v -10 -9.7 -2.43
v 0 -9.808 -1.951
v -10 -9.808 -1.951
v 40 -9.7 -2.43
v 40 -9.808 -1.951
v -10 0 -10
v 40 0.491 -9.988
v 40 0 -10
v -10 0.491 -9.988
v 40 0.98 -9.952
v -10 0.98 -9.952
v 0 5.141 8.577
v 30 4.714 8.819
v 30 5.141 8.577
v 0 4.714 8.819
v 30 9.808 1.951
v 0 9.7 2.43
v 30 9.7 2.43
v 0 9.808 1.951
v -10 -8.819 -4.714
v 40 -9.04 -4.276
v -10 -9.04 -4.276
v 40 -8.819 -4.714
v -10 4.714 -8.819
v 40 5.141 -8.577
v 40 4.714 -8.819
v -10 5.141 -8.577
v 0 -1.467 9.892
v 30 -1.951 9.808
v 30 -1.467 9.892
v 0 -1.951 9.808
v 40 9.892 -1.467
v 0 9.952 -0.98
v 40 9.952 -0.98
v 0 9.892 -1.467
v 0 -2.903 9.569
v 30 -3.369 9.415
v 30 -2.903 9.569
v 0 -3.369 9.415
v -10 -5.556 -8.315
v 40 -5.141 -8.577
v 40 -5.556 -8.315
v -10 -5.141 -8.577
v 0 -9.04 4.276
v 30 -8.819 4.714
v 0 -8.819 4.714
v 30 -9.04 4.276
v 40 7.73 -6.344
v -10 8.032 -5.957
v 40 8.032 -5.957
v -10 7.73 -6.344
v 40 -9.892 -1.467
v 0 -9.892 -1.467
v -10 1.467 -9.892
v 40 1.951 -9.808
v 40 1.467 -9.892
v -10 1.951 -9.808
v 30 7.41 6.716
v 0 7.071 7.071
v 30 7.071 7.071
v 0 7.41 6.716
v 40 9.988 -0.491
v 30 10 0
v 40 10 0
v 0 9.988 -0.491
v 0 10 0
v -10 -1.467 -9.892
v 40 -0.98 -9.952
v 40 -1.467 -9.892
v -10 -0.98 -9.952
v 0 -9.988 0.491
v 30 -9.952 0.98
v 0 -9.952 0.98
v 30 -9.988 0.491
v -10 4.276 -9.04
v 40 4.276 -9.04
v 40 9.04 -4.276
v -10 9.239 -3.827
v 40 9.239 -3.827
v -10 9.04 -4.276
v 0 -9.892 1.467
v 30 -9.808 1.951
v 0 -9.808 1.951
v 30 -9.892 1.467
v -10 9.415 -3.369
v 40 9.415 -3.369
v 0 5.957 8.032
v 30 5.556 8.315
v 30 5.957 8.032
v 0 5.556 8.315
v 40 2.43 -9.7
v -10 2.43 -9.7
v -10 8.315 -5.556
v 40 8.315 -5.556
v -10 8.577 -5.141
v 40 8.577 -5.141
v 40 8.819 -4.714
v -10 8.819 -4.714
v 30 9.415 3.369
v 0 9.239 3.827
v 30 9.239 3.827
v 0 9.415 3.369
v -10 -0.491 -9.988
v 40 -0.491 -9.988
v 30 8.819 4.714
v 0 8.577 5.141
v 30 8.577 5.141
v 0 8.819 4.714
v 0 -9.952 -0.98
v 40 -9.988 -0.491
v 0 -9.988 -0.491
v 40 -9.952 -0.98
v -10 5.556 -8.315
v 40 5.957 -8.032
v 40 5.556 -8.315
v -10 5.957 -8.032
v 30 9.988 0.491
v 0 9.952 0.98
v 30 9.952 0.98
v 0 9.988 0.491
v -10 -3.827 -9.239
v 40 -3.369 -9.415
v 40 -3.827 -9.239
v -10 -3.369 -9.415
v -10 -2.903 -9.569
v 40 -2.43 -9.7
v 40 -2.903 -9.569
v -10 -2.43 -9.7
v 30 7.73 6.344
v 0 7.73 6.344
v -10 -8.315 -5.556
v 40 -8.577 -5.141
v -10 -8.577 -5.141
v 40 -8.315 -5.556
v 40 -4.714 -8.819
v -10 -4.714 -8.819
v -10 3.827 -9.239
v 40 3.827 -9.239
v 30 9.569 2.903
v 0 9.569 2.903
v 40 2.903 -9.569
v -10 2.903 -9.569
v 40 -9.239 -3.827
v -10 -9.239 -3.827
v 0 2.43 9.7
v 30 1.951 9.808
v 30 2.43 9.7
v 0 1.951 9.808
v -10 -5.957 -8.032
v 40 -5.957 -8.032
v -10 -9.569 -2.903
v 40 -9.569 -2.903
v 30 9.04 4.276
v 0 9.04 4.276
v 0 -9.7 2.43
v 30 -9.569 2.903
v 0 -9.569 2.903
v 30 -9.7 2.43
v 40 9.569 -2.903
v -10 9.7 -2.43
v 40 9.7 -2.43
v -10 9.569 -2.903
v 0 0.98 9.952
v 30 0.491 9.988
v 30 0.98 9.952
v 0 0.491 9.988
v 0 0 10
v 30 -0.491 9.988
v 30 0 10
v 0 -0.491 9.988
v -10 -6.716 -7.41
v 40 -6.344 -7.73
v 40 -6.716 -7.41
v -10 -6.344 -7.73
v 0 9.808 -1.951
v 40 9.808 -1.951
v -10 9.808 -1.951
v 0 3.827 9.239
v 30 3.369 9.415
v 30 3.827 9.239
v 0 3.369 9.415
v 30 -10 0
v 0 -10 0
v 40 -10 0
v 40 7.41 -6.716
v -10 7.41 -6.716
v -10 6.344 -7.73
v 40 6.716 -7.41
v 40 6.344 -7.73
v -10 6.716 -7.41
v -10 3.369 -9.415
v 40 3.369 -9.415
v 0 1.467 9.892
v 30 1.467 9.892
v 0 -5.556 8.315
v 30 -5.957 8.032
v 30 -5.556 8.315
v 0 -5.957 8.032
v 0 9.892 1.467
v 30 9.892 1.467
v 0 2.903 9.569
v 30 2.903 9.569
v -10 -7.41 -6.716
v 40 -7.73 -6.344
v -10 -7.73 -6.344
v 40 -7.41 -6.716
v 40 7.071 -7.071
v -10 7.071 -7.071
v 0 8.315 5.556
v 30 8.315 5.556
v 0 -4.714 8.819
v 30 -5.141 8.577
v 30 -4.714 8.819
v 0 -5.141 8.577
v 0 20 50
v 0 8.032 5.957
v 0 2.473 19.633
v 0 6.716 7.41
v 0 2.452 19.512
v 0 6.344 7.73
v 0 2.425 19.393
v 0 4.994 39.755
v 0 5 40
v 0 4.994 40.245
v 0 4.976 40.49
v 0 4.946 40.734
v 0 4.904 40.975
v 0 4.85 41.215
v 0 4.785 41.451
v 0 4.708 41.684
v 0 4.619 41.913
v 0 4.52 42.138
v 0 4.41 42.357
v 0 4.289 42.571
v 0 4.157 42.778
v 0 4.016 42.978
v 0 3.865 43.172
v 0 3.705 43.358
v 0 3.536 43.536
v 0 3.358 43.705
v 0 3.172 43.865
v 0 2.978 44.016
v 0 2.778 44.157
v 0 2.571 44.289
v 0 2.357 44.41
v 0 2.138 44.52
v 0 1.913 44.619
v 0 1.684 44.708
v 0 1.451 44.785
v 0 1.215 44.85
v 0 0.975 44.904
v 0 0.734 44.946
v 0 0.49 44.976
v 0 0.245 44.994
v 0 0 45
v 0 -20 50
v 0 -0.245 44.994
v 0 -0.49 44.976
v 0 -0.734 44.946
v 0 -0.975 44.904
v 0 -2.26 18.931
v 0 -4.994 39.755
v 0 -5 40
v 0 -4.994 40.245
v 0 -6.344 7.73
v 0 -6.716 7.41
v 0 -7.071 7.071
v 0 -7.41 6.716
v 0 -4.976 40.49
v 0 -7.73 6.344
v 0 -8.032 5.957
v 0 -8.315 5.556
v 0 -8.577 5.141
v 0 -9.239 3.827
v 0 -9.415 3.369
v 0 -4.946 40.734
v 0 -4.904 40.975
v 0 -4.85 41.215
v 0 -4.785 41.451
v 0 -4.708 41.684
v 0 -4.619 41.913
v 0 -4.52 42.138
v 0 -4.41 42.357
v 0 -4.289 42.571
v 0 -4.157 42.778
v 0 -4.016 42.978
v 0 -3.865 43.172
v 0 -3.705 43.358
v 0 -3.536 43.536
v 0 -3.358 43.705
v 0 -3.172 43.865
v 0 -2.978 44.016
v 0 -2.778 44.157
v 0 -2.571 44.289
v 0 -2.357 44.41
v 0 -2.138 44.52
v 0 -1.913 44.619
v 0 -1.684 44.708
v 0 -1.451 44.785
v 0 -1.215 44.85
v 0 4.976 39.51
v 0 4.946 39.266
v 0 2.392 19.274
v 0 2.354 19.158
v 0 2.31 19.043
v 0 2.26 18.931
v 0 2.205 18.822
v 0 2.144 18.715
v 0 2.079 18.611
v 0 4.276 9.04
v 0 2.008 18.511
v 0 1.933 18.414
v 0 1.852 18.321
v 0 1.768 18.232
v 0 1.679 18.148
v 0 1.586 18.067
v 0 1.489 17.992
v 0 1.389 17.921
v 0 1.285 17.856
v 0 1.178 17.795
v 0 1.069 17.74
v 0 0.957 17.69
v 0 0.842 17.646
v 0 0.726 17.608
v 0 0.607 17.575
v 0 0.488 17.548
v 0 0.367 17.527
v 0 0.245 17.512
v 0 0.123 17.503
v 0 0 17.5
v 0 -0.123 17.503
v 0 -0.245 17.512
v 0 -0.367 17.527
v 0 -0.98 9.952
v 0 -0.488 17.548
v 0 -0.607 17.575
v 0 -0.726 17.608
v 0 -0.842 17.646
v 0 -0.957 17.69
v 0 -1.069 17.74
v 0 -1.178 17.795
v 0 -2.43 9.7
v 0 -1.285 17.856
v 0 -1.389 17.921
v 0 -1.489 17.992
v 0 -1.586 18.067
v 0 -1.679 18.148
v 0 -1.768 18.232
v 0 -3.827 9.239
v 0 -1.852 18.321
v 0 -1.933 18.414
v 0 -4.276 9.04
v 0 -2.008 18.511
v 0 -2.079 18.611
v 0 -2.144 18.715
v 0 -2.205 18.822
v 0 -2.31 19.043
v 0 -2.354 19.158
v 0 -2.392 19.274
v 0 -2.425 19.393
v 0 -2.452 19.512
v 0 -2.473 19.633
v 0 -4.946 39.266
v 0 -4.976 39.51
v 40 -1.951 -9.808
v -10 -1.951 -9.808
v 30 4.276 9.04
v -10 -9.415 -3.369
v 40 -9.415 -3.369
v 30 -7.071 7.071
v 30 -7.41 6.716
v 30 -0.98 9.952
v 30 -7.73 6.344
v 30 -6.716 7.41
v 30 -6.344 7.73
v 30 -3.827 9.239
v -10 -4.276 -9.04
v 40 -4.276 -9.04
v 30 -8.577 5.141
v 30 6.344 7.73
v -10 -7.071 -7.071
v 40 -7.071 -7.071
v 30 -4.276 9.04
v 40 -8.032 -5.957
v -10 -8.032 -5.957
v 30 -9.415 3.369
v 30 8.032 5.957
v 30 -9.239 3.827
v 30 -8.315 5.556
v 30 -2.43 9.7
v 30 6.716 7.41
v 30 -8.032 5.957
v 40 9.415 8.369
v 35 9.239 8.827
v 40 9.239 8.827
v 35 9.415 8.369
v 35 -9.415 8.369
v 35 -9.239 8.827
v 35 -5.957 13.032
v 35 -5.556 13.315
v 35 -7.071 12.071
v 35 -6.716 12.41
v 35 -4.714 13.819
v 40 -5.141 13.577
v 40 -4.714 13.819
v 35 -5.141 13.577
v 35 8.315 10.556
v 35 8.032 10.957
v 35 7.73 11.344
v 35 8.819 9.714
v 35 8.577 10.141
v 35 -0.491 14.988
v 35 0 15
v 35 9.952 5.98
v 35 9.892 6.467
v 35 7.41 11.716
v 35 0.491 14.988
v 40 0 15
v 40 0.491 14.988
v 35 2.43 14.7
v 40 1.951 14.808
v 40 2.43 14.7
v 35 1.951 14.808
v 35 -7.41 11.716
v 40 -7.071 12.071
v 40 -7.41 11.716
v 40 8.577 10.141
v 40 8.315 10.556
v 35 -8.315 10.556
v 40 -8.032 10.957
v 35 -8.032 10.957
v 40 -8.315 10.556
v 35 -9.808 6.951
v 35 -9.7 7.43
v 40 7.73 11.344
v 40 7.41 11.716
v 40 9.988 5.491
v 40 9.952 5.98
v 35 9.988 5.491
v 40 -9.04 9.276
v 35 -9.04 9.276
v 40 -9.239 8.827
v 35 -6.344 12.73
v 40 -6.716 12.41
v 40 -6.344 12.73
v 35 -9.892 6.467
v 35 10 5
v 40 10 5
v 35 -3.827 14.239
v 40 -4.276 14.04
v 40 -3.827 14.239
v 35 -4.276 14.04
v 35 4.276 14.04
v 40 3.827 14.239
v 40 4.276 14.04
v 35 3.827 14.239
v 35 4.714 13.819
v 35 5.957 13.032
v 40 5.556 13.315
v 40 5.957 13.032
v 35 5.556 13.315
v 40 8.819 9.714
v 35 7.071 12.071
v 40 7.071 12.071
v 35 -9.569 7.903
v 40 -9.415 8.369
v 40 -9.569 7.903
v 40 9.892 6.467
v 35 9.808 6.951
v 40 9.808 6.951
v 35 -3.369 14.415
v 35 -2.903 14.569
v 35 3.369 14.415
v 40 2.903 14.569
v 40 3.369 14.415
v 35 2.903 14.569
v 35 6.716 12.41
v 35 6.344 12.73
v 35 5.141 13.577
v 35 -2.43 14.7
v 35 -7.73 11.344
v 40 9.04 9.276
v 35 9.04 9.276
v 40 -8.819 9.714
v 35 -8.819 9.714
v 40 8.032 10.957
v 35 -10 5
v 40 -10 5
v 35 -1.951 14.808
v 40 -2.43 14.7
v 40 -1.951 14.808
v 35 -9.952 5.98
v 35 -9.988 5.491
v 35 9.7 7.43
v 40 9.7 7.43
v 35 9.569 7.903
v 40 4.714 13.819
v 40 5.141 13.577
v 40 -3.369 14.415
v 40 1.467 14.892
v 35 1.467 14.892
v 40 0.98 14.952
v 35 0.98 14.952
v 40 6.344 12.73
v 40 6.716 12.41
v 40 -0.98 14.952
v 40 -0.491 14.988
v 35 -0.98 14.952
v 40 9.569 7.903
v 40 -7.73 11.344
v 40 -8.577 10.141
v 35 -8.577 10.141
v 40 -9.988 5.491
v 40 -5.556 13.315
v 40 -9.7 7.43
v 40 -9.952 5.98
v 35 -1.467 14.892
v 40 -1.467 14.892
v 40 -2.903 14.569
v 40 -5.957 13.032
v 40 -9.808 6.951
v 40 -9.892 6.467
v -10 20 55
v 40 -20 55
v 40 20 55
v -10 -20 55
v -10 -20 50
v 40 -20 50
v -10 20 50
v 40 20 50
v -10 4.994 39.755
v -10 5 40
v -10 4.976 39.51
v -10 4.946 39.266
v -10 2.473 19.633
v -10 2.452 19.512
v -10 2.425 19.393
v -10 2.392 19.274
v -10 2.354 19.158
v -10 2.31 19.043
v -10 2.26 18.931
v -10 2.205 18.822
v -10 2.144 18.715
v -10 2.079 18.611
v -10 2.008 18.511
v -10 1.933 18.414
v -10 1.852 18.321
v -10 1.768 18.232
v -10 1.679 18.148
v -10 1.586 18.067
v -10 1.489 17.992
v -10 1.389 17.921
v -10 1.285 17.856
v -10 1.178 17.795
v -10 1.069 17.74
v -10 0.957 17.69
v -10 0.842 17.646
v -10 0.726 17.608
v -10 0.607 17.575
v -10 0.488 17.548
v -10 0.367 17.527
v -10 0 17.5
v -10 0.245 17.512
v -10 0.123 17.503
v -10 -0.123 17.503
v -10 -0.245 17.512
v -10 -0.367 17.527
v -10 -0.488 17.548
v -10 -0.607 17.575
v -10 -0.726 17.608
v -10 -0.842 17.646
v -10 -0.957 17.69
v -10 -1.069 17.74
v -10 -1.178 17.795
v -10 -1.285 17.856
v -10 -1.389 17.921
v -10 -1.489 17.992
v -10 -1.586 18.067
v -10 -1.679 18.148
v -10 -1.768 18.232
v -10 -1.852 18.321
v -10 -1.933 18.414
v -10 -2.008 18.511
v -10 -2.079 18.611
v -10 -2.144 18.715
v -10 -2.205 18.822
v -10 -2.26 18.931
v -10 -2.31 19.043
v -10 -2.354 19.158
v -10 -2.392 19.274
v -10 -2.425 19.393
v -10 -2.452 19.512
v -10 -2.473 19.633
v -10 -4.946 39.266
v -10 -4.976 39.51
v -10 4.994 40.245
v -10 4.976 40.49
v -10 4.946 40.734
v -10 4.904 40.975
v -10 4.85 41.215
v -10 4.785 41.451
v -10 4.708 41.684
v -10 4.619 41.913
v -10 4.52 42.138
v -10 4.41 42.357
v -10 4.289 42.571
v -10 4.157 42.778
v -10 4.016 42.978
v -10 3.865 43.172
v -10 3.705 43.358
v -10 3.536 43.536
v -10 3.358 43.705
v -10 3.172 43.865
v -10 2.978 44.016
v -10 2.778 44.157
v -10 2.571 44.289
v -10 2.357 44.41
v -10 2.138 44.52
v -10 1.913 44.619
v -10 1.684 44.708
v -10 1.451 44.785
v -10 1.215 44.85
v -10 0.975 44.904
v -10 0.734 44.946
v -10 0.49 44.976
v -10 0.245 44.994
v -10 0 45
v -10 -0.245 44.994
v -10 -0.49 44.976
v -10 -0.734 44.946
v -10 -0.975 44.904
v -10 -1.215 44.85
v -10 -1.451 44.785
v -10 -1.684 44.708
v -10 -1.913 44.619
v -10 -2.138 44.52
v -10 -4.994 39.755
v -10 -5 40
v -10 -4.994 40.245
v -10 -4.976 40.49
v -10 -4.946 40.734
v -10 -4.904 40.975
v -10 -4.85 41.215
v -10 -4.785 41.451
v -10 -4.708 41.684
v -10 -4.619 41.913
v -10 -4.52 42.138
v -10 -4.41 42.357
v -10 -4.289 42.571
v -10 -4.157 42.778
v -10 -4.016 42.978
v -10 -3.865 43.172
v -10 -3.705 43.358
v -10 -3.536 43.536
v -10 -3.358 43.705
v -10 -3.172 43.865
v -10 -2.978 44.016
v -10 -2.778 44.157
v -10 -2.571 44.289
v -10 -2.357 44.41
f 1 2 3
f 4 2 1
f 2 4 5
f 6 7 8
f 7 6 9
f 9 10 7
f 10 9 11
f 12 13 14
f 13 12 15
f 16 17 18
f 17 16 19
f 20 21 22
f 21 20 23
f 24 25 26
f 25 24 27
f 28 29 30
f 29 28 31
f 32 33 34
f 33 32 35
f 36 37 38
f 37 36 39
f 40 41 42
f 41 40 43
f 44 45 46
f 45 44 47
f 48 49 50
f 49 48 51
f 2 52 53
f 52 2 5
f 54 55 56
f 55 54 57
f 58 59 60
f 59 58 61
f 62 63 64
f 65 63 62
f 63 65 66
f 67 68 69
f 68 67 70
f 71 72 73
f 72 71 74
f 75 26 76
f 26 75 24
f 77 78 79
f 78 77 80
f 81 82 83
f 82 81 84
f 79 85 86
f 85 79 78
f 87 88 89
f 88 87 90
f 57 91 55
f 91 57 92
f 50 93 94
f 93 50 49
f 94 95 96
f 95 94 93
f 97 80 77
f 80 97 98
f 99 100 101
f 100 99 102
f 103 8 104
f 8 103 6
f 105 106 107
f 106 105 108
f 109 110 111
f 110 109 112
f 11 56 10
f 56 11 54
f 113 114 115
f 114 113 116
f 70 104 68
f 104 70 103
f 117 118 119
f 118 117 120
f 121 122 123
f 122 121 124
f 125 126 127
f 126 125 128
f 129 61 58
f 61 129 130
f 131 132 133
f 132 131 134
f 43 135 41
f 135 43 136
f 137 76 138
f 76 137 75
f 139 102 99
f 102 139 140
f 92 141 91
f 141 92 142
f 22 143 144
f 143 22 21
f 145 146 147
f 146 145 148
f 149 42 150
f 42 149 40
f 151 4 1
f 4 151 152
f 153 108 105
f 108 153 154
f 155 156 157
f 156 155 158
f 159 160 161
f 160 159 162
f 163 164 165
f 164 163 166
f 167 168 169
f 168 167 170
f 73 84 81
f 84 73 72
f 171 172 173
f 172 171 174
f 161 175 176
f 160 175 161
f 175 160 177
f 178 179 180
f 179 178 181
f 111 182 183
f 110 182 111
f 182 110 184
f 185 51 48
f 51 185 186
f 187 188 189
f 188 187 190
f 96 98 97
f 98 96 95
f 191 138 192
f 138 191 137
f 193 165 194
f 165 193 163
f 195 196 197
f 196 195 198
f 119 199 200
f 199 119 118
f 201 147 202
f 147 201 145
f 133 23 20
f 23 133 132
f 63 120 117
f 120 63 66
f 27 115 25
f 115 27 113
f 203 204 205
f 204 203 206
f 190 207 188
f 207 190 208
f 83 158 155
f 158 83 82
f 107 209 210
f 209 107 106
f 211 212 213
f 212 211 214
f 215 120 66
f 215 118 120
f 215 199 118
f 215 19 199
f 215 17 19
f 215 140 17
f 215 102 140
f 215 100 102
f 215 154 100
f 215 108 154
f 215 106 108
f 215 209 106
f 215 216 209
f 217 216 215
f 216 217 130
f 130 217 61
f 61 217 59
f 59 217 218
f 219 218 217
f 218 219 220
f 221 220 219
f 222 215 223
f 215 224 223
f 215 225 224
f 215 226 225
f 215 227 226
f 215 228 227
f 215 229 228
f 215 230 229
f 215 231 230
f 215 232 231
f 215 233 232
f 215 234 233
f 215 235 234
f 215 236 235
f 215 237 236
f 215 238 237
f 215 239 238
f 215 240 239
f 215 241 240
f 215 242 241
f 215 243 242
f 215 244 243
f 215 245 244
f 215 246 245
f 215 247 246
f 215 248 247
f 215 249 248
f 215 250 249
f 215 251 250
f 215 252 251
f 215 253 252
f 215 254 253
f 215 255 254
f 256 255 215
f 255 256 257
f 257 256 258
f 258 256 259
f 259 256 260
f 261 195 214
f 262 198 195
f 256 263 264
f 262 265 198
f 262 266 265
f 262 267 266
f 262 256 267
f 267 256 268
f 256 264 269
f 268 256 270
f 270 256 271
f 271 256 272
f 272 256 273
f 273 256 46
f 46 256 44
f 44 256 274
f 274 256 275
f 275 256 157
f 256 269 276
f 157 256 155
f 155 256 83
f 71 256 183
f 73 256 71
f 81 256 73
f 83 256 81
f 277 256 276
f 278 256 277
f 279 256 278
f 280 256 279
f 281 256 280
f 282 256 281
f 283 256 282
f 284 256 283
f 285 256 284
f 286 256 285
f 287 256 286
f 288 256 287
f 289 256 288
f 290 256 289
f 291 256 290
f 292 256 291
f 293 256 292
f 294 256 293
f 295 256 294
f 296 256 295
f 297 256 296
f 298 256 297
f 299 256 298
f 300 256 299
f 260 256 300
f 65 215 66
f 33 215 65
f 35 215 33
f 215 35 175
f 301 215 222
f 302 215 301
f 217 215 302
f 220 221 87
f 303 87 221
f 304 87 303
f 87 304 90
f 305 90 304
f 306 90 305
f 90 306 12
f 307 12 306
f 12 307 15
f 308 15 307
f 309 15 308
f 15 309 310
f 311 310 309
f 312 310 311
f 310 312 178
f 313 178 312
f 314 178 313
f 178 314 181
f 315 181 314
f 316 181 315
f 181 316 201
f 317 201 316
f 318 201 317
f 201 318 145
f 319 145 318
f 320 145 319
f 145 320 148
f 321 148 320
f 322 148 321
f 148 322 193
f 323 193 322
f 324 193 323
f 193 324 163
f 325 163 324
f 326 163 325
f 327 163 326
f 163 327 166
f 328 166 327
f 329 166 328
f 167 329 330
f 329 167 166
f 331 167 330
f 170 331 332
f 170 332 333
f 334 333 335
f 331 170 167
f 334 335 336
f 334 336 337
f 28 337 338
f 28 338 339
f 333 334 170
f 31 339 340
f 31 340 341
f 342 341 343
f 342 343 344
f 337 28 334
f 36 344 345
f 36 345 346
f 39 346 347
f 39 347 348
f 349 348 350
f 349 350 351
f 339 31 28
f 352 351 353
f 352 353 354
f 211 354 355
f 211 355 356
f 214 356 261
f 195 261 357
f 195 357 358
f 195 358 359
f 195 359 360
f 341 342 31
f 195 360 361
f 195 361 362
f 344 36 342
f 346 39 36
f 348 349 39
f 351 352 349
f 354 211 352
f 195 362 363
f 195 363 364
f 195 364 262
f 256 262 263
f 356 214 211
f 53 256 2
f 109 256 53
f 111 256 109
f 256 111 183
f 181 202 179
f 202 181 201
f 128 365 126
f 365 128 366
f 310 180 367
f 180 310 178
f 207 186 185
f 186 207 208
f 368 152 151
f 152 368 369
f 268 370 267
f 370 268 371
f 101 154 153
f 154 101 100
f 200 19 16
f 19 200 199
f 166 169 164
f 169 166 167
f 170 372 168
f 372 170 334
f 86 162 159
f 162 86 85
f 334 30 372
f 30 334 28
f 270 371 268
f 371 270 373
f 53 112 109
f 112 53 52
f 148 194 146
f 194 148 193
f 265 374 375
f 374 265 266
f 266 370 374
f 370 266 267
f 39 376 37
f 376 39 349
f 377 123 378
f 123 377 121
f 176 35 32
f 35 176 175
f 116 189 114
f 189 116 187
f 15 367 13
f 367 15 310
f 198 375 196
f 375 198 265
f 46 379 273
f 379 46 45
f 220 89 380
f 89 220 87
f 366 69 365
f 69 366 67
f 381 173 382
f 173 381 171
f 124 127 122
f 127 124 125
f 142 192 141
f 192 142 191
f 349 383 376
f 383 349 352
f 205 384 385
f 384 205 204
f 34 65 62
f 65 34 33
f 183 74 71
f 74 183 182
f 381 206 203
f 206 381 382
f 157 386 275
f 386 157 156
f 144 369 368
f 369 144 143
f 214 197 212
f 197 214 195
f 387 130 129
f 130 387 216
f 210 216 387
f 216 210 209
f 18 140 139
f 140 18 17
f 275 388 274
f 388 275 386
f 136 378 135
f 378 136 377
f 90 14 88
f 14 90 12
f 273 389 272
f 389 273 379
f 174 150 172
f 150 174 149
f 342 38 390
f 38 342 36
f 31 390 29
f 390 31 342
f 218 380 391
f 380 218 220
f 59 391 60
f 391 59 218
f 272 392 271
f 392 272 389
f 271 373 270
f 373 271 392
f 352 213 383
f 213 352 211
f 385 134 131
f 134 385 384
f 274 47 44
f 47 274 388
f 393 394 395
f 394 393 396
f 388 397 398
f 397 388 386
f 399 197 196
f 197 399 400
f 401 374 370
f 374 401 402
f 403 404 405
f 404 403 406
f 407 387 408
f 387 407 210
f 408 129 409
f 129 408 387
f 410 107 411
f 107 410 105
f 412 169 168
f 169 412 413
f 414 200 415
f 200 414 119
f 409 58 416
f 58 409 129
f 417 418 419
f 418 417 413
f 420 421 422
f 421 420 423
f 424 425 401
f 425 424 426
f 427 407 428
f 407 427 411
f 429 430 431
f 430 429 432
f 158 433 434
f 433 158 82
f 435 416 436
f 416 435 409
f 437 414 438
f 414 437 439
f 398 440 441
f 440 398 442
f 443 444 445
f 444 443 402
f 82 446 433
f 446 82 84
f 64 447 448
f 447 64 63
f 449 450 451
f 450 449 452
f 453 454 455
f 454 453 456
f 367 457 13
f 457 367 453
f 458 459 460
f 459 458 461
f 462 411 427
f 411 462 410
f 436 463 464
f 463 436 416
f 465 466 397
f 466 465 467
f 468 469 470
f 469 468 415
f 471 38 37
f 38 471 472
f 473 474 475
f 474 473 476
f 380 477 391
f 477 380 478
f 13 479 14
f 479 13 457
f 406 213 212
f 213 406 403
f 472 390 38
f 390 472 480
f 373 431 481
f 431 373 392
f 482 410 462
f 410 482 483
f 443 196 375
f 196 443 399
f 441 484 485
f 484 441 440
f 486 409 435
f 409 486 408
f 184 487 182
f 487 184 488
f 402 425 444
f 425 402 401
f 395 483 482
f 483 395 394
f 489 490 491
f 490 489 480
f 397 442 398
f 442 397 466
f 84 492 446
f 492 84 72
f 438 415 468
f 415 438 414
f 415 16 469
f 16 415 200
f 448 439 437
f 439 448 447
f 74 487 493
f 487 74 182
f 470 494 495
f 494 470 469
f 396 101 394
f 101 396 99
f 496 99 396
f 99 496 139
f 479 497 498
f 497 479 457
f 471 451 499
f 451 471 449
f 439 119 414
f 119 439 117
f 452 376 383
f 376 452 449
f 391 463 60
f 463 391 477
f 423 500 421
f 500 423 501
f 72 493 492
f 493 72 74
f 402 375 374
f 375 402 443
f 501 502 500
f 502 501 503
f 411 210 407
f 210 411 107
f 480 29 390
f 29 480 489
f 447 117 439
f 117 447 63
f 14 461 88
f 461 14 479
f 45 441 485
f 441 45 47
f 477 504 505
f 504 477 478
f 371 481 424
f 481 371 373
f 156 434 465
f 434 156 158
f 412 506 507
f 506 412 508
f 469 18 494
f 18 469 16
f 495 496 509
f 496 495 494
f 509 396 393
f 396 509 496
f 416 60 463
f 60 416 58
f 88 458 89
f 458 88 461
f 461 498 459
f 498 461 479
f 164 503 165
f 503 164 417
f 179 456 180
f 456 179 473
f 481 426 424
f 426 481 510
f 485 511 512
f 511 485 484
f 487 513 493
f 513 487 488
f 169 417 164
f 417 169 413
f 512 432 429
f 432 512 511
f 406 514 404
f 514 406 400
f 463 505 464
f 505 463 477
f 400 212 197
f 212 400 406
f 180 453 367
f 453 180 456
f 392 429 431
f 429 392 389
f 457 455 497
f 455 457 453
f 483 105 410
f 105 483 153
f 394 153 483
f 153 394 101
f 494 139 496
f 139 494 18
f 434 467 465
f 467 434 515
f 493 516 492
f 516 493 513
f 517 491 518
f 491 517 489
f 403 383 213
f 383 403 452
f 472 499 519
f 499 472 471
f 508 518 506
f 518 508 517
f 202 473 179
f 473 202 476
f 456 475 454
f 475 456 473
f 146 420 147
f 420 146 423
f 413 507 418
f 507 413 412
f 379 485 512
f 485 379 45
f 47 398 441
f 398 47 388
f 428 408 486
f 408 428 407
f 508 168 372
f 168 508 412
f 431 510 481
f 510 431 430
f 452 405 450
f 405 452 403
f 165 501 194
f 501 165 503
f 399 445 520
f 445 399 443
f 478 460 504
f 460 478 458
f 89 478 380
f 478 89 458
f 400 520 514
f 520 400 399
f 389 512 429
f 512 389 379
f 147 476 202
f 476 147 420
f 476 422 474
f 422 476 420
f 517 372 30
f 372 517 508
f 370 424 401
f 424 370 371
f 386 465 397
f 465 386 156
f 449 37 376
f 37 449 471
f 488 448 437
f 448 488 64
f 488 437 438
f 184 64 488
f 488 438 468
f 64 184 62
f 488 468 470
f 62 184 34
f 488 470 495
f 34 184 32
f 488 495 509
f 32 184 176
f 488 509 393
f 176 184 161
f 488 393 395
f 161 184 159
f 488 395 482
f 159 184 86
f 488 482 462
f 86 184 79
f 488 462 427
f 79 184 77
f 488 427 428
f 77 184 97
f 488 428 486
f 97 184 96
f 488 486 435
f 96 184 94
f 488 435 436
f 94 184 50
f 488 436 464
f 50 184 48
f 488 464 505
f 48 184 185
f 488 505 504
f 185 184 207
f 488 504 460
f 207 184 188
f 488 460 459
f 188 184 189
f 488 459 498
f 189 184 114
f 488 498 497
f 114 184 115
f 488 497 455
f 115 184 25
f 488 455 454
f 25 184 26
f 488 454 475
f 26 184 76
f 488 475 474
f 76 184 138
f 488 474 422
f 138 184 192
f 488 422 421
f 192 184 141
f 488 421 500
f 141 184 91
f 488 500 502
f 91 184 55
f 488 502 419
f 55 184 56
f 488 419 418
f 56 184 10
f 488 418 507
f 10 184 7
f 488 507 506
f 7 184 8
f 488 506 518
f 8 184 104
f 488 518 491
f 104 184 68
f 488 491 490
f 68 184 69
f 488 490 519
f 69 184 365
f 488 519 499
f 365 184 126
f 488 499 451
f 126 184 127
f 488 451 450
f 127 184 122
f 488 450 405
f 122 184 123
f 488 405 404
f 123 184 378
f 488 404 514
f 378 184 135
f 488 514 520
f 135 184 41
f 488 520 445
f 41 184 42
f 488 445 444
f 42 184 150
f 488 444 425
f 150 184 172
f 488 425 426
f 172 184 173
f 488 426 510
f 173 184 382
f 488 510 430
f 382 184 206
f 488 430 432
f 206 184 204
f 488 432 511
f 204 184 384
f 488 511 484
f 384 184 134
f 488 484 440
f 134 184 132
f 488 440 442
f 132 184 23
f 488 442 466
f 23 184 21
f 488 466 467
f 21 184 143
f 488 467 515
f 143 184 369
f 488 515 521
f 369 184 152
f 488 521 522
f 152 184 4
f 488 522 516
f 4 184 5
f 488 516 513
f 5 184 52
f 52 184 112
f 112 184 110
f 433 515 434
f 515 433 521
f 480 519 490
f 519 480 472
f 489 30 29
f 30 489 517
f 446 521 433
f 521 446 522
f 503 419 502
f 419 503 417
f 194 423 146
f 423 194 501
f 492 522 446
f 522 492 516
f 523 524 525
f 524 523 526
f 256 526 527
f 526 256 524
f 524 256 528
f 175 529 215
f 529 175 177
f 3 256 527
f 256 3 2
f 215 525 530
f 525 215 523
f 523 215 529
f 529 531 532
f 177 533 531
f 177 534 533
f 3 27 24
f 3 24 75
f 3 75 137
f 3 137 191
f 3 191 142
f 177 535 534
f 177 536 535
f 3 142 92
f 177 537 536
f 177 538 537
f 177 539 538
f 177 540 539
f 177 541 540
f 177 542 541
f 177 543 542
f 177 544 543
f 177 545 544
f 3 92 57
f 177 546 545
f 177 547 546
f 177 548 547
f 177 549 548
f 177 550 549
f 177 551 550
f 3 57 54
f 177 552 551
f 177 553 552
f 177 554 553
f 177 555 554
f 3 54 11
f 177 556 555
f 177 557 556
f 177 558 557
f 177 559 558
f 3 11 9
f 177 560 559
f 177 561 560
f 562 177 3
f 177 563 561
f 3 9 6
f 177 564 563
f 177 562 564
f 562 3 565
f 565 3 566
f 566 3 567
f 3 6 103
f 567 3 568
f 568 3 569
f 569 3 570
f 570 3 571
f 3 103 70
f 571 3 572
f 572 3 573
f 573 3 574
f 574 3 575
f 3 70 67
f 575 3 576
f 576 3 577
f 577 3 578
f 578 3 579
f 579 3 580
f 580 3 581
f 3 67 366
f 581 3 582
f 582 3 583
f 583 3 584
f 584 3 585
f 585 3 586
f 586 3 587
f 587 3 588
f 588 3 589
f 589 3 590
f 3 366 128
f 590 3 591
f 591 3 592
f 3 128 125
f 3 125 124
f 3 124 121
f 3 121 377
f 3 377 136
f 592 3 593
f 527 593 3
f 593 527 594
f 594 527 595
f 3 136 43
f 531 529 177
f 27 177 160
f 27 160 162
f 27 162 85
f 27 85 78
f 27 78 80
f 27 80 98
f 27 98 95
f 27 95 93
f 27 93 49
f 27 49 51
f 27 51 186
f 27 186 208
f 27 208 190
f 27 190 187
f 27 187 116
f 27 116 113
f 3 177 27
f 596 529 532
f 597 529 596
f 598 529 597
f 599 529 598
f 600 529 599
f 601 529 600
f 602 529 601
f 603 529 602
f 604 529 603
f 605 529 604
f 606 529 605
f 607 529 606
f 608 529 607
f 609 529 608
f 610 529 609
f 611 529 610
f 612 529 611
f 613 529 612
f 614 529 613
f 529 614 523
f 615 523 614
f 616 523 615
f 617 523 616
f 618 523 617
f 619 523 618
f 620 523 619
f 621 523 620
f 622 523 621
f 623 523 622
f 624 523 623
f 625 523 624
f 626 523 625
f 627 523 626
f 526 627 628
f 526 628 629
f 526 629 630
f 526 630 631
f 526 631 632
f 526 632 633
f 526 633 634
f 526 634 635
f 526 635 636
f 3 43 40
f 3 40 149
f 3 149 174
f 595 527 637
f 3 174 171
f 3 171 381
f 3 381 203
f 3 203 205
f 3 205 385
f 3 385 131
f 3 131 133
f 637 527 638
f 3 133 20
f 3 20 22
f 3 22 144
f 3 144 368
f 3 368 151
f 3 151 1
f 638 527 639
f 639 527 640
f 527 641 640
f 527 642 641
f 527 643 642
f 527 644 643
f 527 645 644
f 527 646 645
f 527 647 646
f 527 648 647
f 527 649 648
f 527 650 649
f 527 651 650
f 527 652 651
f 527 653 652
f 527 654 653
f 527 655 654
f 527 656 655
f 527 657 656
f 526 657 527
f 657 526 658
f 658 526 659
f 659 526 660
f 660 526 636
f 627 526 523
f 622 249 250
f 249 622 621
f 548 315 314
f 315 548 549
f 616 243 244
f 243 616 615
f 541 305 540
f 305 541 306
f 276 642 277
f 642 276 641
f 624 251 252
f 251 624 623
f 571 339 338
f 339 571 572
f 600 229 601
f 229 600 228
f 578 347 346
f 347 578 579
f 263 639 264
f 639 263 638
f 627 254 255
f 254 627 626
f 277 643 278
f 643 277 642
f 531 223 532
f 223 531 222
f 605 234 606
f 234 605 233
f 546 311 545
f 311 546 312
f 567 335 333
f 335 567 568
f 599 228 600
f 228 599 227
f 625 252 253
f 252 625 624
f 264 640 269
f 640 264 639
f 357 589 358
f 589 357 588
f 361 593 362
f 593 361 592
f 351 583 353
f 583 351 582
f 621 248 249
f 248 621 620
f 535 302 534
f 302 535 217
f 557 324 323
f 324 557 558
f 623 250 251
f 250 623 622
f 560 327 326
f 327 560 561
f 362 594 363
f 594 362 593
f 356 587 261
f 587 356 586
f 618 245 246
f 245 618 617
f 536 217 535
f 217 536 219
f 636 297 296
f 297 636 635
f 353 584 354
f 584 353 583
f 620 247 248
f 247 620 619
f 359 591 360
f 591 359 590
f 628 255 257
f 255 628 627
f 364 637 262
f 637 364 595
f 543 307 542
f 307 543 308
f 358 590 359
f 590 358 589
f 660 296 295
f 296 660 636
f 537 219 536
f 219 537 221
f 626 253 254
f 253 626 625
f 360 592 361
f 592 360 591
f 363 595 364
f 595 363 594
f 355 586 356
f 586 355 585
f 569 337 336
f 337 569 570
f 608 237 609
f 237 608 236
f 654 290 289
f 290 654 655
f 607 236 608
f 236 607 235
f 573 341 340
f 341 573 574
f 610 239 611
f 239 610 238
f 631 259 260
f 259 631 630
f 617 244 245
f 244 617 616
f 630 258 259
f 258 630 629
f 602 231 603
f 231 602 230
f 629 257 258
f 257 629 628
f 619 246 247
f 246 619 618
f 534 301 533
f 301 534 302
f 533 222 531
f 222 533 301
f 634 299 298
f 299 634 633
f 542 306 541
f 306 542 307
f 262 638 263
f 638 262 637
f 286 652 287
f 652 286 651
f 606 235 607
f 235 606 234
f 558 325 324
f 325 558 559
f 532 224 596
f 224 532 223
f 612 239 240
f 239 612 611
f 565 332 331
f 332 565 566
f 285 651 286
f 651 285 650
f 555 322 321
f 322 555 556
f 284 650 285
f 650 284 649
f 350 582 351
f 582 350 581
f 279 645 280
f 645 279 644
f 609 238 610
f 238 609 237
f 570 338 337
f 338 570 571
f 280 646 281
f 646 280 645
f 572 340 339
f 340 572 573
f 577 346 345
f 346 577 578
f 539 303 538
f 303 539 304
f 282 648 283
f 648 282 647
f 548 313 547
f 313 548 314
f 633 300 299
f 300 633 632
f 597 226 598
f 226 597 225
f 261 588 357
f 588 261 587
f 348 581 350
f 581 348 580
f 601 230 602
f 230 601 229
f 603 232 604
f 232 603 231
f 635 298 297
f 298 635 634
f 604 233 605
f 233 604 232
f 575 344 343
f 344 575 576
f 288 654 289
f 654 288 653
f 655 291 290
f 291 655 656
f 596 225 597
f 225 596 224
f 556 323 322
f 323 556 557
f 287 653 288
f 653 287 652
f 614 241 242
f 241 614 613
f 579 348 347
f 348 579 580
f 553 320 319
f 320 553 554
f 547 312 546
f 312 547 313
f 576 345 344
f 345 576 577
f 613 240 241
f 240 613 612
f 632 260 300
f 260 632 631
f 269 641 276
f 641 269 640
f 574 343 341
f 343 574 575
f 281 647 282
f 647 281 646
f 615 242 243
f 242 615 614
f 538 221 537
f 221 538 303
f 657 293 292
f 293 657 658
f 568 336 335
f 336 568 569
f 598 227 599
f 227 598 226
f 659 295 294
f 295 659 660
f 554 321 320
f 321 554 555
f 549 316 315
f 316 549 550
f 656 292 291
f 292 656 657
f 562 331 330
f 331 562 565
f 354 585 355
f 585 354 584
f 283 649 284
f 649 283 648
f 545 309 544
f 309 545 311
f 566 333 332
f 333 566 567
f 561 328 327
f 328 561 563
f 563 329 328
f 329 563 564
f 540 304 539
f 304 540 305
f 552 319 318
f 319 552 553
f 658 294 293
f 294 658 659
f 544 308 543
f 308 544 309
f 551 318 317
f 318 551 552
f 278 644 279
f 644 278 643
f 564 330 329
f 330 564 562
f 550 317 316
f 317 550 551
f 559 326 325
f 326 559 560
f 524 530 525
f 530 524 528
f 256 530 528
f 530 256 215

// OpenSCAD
$fn = 128;

module body() {
    
    translate([-10, 0, 0]) {
        // connector
        difference() {
            hull() {
                rotate([0, 90, 0])
                cylinder(d=20, h=10);
                
                translate([0, -20, 50])
                cube([10, 40, 5]);
            }
            
            // cutout
            hull() {
                translate([0, 0, 20])
                rotate([0, 90, 0])
                cylinder(d=5, h=10);
                translate([0, 0, 40])
                rotate([0, 90, 0])
                cylinder(d=10, h=10);
            }
        }
        
        // top part
        translate([10, -20, 50]) {
            cube([40, 40, 5]);
        }
    }
}


module hook(bandwidth = 30) {
    rotate([0, 90, 0]) {
        // main holder
        cylinder(d=20, h = bandwidth);
    
        // retainer
        translate([0, 0, bandwidth])
        hull() {
            cylinder(d = 20, h = 10);
            translate([-5, 0, 5])
            cylinder(d = 20, h = 5);
        }
    }
}

hook();
body();
